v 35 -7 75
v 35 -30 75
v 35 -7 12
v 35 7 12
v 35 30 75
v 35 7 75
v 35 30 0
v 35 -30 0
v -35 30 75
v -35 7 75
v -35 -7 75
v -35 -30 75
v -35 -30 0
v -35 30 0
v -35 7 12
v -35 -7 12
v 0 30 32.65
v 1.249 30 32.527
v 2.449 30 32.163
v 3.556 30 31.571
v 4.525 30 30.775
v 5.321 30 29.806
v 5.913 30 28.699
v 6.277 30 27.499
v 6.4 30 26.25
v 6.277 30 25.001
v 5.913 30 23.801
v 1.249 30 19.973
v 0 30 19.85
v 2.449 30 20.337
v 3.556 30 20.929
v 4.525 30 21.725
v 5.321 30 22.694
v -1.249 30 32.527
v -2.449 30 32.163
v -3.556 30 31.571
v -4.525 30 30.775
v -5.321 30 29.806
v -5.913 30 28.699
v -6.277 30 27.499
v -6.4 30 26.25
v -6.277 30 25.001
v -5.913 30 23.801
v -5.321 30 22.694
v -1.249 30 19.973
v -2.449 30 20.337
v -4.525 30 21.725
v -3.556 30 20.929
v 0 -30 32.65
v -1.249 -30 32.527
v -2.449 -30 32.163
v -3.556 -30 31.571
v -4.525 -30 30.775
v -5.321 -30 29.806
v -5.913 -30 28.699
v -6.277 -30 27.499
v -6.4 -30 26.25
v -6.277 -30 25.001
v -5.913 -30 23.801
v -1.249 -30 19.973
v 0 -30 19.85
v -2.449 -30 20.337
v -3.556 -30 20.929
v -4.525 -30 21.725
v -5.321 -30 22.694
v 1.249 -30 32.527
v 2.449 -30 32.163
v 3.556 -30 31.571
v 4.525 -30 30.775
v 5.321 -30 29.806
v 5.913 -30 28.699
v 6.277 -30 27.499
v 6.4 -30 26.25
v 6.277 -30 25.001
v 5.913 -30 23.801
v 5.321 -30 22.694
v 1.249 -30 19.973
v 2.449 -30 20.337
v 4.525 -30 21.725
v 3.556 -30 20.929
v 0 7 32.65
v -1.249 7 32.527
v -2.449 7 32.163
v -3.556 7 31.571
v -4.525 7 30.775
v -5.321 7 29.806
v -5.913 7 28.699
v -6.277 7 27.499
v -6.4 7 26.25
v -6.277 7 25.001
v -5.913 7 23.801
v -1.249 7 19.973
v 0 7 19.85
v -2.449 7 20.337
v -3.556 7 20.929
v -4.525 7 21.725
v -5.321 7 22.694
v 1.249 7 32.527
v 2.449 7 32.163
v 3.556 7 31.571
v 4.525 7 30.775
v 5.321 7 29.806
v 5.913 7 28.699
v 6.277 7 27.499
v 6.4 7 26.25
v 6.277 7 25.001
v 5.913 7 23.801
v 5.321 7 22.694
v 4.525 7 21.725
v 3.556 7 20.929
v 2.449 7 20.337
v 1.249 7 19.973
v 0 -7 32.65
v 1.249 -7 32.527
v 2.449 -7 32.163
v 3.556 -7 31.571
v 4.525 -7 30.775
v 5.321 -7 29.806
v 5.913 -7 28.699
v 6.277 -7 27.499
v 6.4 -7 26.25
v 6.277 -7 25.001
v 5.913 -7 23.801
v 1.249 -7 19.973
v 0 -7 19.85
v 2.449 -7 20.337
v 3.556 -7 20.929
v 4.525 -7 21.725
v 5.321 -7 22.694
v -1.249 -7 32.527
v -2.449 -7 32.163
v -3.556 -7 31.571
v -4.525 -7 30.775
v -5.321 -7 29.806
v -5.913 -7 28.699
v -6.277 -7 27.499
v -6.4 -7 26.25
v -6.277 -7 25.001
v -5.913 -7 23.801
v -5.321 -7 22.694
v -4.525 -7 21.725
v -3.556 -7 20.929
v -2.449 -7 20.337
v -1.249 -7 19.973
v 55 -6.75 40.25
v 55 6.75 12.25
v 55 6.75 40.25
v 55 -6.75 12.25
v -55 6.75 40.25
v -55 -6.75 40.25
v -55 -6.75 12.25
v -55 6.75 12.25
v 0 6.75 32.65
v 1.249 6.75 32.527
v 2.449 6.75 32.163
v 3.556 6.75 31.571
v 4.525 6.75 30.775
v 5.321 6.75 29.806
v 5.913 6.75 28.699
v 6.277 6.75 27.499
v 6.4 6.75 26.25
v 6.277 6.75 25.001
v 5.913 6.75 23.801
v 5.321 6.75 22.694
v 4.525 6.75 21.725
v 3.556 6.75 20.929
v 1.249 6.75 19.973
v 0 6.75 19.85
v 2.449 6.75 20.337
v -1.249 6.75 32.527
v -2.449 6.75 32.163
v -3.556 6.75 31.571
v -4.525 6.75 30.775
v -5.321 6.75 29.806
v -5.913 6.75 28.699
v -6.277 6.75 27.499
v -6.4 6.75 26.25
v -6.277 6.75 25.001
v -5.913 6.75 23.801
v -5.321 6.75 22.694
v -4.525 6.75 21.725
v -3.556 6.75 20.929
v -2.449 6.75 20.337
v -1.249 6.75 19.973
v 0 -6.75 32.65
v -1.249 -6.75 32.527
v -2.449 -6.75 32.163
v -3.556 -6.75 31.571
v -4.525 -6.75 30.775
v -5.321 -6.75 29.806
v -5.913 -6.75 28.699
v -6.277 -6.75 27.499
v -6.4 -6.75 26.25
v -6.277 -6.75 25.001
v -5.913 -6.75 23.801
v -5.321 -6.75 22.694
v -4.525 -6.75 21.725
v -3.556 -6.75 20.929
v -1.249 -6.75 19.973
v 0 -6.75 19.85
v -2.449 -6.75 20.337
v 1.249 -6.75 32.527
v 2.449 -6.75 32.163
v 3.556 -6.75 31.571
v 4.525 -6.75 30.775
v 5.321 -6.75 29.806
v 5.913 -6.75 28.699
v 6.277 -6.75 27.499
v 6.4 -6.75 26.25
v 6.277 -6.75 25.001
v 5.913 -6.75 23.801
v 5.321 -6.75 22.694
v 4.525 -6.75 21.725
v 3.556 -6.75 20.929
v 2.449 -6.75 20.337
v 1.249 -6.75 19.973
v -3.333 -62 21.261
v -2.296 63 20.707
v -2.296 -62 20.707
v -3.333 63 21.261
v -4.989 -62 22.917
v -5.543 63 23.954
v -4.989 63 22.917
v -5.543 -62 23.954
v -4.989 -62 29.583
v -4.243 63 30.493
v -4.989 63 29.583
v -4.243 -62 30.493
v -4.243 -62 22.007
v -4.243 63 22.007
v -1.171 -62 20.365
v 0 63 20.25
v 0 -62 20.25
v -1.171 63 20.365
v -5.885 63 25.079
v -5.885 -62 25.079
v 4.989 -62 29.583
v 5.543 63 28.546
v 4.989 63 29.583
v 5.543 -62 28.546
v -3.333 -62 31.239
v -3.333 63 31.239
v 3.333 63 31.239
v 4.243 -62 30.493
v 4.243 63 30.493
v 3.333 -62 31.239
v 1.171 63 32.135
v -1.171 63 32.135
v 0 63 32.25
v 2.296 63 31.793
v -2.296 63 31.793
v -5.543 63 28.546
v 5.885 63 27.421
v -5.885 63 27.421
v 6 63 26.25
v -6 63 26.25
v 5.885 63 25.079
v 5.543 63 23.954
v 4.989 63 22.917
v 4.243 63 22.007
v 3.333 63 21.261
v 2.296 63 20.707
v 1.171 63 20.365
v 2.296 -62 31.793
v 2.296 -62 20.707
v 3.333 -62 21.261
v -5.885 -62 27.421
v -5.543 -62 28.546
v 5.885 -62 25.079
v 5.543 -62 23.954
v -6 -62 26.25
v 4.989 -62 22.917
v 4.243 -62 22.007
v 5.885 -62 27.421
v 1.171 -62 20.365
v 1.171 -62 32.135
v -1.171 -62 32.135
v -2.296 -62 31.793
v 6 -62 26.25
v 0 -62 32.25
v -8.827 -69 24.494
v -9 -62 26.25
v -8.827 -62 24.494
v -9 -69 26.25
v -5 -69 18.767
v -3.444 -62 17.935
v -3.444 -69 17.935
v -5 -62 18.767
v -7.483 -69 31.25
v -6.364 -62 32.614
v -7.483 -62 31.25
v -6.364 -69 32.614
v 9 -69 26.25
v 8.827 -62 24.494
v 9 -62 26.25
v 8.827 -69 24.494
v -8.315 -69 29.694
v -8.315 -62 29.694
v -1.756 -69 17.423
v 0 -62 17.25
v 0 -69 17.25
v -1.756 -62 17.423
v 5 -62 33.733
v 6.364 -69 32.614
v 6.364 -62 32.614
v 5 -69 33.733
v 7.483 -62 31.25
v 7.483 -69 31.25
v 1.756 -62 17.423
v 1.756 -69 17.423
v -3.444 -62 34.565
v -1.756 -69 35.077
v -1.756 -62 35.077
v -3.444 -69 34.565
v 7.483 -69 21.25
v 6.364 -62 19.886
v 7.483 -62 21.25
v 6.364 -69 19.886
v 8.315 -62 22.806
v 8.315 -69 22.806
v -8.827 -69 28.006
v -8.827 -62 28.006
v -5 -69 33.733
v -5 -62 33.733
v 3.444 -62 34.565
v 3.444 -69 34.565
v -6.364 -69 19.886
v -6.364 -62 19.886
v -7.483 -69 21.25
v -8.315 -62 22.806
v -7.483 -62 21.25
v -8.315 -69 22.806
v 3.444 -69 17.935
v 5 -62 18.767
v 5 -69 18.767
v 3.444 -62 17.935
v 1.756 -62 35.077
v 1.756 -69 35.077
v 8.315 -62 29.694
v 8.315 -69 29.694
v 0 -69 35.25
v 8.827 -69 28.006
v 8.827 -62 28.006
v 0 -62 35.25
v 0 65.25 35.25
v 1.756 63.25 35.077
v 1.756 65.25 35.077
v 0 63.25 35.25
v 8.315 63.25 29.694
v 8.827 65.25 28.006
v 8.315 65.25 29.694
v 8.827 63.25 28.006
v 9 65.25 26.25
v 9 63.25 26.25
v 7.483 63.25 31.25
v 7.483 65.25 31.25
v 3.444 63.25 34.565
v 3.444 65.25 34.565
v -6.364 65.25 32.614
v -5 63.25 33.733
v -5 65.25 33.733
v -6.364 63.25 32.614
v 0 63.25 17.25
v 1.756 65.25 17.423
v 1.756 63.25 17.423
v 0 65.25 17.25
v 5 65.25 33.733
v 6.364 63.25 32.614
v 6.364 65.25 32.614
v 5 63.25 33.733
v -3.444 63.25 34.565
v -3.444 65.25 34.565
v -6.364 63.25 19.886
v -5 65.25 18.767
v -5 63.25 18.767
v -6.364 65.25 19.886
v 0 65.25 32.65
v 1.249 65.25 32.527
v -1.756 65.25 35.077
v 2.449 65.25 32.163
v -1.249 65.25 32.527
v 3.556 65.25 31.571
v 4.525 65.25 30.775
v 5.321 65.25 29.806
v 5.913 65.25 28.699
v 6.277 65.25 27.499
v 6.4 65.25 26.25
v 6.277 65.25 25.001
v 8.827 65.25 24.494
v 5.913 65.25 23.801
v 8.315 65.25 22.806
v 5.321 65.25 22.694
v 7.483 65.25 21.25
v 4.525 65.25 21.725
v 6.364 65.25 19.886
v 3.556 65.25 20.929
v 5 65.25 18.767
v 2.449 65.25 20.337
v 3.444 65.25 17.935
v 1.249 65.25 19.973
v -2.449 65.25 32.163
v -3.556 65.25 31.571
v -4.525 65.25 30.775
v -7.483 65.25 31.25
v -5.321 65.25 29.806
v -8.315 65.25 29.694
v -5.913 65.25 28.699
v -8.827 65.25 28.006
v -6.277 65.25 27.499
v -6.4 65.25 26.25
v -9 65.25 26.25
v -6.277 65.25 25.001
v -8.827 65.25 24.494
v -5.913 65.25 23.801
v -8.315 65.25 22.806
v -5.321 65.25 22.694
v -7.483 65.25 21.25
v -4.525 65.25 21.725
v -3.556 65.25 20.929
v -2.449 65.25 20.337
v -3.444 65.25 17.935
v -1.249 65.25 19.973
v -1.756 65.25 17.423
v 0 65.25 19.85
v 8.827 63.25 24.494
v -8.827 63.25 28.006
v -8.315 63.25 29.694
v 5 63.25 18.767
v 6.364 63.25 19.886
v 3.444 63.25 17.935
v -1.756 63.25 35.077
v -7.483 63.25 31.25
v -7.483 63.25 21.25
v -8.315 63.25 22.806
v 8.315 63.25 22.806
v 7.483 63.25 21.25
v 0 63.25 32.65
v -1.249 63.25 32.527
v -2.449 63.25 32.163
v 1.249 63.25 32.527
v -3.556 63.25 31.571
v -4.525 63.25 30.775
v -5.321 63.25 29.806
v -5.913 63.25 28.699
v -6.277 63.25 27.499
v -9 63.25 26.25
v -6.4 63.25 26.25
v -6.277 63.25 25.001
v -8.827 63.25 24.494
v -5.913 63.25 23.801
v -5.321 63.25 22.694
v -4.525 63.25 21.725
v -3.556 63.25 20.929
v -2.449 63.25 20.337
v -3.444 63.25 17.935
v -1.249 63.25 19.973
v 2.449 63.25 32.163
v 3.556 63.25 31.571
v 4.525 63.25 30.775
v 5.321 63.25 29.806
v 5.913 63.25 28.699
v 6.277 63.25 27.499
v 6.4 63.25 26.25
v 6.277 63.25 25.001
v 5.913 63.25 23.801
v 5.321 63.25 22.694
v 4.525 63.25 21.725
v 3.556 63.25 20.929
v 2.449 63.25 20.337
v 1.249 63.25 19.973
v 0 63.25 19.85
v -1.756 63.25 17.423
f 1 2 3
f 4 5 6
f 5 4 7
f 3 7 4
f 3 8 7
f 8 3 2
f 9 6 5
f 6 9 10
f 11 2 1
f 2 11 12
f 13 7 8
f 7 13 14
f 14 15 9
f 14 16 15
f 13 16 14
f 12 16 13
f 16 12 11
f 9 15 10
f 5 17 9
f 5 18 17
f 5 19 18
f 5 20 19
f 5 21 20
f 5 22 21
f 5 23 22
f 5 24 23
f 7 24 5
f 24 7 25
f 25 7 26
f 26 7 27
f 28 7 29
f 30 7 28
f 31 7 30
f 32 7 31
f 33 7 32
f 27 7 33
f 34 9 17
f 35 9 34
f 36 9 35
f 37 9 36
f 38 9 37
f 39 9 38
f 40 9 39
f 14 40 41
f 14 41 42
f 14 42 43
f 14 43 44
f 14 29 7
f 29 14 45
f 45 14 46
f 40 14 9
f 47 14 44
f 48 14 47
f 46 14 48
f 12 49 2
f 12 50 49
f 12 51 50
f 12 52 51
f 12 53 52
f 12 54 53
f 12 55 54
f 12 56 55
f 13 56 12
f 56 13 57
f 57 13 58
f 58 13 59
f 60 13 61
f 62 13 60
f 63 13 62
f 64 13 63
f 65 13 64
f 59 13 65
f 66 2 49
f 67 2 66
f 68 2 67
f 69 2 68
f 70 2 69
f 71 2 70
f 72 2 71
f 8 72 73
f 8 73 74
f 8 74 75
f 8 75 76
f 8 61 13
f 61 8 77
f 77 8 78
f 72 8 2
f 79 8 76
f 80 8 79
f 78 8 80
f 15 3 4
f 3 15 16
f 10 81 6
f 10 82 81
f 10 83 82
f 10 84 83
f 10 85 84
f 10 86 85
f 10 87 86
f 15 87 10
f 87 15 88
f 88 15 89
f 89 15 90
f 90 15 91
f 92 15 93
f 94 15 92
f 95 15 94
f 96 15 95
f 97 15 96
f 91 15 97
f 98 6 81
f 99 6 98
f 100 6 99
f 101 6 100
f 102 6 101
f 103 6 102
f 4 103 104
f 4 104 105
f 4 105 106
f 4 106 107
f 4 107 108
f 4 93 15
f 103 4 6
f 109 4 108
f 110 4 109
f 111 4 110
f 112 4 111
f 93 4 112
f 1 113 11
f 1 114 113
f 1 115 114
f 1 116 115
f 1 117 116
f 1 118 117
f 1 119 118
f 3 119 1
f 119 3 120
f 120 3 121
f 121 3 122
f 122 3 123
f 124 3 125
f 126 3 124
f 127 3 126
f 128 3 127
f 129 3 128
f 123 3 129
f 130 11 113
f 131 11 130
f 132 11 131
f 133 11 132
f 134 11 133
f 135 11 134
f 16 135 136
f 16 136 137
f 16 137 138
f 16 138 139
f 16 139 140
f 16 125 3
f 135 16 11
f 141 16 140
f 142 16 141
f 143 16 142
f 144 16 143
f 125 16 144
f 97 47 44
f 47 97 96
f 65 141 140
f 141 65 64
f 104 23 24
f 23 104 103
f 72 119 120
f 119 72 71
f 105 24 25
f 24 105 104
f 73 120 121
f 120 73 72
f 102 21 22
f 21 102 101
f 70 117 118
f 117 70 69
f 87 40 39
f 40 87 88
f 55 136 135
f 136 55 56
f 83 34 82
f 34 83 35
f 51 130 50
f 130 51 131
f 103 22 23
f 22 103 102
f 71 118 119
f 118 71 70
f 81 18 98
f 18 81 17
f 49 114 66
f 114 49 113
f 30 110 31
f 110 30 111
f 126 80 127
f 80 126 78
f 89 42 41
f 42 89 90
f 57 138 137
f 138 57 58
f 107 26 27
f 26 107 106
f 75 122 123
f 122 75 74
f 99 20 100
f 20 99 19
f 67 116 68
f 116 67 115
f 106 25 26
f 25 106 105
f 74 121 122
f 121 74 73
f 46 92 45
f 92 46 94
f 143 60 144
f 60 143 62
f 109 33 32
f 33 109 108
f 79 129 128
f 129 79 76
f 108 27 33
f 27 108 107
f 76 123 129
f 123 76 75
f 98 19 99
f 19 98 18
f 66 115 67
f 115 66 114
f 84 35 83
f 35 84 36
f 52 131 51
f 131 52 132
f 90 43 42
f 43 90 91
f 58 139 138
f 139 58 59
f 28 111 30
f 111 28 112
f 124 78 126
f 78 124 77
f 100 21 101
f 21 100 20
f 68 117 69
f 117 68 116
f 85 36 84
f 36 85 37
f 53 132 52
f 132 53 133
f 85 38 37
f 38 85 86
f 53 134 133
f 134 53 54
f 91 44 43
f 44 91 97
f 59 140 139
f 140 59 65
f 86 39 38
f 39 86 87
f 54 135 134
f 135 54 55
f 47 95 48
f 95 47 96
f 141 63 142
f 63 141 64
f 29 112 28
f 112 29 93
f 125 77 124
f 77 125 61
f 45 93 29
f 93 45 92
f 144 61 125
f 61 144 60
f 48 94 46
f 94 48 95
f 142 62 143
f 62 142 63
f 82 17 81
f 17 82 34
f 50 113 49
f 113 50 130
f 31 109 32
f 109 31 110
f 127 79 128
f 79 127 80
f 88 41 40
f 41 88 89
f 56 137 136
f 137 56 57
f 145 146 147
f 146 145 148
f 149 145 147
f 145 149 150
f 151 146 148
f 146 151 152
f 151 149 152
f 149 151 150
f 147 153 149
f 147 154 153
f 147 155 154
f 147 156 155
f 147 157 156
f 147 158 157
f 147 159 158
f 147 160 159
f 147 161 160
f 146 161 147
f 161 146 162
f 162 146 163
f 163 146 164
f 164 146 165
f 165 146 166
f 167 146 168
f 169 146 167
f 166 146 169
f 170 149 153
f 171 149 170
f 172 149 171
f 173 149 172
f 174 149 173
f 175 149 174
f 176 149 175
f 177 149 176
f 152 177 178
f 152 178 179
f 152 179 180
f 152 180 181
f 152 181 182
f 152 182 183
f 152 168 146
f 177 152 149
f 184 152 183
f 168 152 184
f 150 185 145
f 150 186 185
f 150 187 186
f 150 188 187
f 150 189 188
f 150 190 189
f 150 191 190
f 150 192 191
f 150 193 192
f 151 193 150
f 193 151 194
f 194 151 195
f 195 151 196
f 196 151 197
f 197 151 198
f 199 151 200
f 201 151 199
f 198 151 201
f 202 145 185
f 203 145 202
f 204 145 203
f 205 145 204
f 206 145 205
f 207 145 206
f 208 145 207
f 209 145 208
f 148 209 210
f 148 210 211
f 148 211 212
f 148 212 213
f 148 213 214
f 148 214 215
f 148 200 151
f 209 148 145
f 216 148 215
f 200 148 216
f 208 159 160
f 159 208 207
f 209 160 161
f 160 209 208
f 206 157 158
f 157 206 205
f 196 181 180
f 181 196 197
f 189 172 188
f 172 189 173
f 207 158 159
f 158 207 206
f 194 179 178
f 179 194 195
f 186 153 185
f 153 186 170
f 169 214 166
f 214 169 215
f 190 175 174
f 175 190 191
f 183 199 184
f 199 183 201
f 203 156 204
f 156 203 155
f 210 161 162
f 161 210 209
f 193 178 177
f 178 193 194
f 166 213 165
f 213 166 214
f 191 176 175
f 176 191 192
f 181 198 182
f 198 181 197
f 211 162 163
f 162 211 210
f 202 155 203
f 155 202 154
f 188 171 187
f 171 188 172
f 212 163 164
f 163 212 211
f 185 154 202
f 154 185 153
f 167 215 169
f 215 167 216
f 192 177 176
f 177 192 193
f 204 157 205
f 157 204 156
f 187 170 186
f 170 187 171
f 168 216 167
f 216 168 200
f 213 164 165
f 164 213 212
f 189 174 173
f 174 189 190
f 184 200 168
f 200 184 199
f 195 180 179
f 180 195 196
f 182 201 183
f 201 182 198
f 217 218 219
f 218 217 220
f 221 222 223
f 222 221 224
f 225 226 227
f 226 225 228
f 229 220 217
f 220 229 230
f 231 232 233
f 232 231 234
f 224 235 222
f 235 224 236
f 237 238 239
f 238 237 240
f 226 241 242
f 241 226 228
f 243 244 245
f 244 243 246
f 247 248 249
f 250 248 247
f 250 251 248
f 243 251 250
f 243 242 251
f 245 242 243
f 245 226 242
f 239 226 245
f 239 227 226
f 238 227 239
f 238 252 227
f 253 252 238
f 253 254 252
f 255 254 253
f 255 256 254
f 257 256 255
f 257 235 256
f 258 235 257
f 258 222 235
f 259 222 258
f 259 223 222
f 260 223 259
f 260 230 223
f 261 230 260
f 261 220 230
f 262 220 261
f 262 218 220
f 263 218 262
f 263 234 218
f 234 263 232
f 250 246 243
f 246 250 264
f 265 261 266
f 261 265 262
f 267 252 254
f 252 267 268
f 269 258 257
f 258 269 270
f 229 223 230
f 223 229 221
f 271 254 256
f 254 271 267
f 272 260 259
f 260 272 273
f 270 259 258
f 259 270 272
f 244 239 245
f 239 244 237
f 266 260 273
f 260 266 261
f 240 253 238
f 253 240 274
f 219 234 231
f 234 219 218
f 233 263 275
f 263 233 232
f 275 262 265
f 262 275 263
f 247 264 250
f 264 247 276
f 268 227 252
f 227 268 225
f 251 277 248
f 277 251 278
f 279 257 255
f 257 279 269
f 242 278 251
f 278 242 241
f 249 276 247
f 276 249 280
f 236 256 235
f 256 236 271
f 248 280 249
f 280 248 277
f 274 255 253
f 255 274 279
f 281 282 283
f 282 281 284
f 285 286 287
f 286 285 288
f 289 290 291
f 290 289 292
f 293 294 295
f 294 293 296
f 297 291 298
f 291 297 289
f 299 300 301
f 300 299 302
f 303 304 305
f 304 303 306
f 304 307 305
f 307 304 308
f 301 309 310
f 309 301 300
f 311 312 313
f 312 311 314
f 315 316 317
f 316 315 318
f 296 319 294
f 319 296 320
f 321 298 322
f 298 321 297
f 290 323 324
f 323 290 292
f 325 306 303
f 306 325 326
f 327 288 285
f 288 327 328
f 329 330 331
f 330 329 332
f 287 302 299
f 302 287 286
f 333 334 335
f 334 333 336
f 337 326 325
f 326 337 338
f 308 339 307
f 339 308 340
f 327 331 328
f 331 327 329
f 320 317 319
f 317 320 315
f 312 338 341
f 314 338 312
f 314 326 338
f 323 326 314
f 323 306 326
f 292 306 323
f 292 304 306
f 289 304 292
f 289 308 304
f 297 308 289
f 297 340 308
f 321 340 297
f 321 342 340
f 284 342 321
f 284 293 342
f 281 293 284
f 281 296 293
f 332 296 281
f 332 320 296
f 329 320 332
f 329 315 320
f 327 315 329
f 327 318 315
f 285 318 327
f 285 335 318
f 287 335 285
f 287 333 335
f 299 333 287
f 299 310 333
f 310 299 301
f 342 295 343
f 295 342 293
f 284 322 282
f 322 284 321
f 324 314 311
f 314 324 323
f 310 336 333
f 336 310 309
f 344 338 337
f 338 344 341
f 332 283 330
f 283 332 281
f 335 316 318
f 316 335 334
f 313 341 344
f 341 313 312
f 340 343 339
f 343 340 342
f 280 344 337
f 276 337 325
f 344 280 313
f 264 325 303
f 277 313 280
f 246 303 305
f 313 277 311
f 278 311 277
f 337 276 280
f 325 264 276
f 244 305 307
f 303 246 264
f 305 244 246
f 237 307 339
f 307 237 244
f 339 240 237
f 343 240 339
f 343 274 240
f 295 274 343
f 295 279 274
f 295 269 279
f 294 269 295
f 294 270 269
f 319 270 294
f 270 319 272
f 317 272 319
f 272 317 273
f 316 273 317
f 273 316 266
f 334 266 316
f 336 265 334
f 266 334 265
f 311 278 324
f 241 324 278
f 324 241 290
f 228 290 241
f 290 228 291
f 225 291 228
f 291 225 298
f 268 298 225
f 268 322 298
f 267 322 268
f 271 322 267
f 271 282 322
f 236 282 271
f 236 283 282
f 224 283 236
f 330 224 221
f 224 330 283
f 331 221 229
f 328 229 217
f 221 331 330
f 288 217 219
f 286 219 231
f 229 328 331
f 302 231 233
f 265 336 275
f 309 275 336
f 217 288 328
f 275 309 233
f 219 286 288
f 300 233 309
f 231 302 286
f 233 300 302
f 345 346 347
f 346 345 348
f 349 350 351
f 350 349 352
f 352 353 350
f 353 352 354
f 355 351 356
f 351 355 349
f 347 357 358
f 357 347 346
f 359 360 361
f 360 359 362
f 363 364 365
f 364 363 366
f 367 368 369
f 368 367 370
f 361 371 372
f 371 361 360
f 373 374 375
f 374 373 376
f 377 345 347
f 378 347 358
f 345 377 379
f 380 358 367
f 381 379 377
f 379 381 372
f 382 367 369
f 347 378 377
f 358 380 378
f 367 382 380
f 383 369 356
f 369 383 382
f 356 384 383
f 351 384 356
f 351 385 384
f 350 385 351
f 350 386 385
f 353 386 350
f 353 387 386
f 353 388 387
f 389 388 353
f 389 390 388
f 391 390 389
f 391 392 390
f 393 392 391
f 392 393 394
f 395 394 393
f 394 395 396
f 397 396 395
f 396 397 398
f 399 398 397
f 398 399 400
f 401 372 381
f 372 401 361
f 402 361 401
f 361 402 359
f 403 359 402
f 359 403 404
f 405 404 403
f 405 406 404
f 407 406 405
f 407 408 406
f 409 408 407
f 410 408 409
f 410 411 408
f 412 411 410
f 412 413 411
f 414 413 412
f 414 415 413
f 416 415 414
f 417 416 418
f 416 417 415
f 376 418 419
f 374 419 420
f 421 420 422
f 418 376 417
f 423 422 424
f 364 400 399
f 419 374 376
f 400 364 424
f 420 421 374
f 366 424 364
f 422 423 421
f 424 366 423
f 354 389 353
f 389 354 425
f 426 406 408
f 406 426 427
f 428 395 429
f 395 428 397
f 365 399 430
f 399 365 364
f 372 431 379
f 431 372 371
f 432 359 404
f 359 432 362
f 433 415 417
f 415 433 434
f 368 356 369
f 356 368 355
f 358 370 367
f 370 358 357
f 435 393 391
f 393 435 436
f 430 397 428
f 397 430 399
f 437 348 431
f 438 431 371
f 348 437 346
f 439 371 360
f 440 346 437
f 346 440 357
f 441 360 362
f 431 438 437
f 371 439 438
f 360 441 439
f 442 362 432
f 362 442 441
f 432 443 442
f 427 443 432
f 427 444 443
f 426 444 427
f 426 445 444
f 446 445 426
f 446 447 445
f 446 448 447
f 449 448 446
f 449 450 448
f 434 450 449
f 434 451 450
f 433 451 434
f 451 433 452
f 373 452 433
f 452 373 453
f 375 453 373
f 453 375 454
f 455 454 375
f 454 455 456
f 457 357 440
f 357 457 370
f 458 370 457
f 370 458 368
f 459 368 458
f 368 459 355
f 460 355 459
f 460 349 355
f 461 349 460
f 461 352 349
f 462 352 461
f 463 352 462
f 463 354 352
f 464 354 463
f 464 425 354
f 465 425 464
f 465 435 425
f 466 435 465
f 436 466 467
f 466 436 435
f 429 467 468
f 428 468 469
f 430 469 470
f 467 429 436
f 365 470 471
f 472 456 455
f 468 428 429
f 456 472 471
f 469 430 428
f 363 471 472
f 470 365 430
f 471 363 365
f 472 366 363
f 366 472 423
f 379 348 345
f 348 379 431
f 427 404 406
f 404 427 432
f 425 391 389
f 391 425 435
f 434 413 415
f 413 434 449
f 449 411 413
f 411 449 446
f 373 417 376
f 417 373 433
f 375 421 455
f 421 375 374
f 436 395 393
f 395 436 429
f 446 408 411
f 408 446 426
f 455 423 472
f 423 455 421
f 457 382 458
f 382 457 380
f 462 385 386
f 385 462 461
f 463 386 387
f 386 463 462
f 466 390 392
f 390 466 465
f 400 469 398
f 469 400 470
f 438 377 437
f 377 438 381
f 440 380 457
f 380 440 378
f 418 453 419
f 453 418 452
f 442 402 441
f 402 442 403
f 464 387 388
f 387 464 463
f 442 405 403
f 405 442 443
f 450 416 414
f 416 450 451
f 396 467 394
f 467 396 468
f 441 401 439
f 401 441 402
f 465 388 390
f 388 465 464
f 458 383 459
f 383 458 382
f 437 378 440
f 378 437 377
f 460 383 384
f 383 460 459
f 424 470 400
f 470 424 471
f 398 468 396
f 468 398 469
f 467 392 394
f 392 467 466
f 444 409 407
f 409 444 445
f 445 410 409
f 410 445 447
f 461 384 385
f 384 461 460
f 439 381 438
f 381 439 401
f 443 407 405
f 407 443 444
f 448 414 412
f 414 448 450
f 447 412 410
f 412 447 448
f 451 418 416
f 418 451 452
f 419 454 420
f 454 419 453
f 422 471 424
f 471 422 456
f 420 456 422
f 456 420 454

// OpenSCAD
$fn = 32;

// ------------------------------------------------------------------------
// Clevis joint: 70 mm clevis, pin d12
// Every part is its own module, assembly() places them once.
// ------------------------------------------------------------------------

// --- part 1 ---
module clevis() {
  difference() {
    translate([-35, -30, 0]) cube([70, 60, 75]);
    translate([-36, -7, 12]) cube([72, 14, 64]);
    translate([0, 0, 26.25]) rotate([90, 0, 0]) cylinder(h = 62, d = 12.8, center = true);
  }
}

// --- part 2 ---
module eye() {
  difference() {
    translate([-55, -6.75, 0]) cube([110, 13.5, 28]);
    translate([0, 0, 14]) rotate([90, 0, 0]) cylinder(h = 15.5, d = 12.8, center = true);
  }
}

// --- part 3 ---
module pin() {
  rotate([0, 90, 0]) cylinder(h = 126, d = 12, center = true);
  translate([-69, 0, 0]) rotate([0, 90, 0]) cylinder(h = 7, d = 18);
}

// --- part 4 ---
module retainer() {
  difference() {
      translate([0, 0, 0]) cylinder(h = 2, d = 18);
      translate([0, 0, -1]) cylinder(h = 4, d = 12.8);
    }
}

// --- assembly ---
module assembly() {
  translate([0, 0, 0]) rotate([0, 0, 0]) clevis();
  translate([0, 0, 12.25]) rotate([0, 0, 0]) eye();
  translate([0, 0, 26.25]) rotate([0, 0, 90]) pin();
  translate([0, 65.25, 26.25]) rotate([90, 0, 0]) retainer();
}

assembly();
